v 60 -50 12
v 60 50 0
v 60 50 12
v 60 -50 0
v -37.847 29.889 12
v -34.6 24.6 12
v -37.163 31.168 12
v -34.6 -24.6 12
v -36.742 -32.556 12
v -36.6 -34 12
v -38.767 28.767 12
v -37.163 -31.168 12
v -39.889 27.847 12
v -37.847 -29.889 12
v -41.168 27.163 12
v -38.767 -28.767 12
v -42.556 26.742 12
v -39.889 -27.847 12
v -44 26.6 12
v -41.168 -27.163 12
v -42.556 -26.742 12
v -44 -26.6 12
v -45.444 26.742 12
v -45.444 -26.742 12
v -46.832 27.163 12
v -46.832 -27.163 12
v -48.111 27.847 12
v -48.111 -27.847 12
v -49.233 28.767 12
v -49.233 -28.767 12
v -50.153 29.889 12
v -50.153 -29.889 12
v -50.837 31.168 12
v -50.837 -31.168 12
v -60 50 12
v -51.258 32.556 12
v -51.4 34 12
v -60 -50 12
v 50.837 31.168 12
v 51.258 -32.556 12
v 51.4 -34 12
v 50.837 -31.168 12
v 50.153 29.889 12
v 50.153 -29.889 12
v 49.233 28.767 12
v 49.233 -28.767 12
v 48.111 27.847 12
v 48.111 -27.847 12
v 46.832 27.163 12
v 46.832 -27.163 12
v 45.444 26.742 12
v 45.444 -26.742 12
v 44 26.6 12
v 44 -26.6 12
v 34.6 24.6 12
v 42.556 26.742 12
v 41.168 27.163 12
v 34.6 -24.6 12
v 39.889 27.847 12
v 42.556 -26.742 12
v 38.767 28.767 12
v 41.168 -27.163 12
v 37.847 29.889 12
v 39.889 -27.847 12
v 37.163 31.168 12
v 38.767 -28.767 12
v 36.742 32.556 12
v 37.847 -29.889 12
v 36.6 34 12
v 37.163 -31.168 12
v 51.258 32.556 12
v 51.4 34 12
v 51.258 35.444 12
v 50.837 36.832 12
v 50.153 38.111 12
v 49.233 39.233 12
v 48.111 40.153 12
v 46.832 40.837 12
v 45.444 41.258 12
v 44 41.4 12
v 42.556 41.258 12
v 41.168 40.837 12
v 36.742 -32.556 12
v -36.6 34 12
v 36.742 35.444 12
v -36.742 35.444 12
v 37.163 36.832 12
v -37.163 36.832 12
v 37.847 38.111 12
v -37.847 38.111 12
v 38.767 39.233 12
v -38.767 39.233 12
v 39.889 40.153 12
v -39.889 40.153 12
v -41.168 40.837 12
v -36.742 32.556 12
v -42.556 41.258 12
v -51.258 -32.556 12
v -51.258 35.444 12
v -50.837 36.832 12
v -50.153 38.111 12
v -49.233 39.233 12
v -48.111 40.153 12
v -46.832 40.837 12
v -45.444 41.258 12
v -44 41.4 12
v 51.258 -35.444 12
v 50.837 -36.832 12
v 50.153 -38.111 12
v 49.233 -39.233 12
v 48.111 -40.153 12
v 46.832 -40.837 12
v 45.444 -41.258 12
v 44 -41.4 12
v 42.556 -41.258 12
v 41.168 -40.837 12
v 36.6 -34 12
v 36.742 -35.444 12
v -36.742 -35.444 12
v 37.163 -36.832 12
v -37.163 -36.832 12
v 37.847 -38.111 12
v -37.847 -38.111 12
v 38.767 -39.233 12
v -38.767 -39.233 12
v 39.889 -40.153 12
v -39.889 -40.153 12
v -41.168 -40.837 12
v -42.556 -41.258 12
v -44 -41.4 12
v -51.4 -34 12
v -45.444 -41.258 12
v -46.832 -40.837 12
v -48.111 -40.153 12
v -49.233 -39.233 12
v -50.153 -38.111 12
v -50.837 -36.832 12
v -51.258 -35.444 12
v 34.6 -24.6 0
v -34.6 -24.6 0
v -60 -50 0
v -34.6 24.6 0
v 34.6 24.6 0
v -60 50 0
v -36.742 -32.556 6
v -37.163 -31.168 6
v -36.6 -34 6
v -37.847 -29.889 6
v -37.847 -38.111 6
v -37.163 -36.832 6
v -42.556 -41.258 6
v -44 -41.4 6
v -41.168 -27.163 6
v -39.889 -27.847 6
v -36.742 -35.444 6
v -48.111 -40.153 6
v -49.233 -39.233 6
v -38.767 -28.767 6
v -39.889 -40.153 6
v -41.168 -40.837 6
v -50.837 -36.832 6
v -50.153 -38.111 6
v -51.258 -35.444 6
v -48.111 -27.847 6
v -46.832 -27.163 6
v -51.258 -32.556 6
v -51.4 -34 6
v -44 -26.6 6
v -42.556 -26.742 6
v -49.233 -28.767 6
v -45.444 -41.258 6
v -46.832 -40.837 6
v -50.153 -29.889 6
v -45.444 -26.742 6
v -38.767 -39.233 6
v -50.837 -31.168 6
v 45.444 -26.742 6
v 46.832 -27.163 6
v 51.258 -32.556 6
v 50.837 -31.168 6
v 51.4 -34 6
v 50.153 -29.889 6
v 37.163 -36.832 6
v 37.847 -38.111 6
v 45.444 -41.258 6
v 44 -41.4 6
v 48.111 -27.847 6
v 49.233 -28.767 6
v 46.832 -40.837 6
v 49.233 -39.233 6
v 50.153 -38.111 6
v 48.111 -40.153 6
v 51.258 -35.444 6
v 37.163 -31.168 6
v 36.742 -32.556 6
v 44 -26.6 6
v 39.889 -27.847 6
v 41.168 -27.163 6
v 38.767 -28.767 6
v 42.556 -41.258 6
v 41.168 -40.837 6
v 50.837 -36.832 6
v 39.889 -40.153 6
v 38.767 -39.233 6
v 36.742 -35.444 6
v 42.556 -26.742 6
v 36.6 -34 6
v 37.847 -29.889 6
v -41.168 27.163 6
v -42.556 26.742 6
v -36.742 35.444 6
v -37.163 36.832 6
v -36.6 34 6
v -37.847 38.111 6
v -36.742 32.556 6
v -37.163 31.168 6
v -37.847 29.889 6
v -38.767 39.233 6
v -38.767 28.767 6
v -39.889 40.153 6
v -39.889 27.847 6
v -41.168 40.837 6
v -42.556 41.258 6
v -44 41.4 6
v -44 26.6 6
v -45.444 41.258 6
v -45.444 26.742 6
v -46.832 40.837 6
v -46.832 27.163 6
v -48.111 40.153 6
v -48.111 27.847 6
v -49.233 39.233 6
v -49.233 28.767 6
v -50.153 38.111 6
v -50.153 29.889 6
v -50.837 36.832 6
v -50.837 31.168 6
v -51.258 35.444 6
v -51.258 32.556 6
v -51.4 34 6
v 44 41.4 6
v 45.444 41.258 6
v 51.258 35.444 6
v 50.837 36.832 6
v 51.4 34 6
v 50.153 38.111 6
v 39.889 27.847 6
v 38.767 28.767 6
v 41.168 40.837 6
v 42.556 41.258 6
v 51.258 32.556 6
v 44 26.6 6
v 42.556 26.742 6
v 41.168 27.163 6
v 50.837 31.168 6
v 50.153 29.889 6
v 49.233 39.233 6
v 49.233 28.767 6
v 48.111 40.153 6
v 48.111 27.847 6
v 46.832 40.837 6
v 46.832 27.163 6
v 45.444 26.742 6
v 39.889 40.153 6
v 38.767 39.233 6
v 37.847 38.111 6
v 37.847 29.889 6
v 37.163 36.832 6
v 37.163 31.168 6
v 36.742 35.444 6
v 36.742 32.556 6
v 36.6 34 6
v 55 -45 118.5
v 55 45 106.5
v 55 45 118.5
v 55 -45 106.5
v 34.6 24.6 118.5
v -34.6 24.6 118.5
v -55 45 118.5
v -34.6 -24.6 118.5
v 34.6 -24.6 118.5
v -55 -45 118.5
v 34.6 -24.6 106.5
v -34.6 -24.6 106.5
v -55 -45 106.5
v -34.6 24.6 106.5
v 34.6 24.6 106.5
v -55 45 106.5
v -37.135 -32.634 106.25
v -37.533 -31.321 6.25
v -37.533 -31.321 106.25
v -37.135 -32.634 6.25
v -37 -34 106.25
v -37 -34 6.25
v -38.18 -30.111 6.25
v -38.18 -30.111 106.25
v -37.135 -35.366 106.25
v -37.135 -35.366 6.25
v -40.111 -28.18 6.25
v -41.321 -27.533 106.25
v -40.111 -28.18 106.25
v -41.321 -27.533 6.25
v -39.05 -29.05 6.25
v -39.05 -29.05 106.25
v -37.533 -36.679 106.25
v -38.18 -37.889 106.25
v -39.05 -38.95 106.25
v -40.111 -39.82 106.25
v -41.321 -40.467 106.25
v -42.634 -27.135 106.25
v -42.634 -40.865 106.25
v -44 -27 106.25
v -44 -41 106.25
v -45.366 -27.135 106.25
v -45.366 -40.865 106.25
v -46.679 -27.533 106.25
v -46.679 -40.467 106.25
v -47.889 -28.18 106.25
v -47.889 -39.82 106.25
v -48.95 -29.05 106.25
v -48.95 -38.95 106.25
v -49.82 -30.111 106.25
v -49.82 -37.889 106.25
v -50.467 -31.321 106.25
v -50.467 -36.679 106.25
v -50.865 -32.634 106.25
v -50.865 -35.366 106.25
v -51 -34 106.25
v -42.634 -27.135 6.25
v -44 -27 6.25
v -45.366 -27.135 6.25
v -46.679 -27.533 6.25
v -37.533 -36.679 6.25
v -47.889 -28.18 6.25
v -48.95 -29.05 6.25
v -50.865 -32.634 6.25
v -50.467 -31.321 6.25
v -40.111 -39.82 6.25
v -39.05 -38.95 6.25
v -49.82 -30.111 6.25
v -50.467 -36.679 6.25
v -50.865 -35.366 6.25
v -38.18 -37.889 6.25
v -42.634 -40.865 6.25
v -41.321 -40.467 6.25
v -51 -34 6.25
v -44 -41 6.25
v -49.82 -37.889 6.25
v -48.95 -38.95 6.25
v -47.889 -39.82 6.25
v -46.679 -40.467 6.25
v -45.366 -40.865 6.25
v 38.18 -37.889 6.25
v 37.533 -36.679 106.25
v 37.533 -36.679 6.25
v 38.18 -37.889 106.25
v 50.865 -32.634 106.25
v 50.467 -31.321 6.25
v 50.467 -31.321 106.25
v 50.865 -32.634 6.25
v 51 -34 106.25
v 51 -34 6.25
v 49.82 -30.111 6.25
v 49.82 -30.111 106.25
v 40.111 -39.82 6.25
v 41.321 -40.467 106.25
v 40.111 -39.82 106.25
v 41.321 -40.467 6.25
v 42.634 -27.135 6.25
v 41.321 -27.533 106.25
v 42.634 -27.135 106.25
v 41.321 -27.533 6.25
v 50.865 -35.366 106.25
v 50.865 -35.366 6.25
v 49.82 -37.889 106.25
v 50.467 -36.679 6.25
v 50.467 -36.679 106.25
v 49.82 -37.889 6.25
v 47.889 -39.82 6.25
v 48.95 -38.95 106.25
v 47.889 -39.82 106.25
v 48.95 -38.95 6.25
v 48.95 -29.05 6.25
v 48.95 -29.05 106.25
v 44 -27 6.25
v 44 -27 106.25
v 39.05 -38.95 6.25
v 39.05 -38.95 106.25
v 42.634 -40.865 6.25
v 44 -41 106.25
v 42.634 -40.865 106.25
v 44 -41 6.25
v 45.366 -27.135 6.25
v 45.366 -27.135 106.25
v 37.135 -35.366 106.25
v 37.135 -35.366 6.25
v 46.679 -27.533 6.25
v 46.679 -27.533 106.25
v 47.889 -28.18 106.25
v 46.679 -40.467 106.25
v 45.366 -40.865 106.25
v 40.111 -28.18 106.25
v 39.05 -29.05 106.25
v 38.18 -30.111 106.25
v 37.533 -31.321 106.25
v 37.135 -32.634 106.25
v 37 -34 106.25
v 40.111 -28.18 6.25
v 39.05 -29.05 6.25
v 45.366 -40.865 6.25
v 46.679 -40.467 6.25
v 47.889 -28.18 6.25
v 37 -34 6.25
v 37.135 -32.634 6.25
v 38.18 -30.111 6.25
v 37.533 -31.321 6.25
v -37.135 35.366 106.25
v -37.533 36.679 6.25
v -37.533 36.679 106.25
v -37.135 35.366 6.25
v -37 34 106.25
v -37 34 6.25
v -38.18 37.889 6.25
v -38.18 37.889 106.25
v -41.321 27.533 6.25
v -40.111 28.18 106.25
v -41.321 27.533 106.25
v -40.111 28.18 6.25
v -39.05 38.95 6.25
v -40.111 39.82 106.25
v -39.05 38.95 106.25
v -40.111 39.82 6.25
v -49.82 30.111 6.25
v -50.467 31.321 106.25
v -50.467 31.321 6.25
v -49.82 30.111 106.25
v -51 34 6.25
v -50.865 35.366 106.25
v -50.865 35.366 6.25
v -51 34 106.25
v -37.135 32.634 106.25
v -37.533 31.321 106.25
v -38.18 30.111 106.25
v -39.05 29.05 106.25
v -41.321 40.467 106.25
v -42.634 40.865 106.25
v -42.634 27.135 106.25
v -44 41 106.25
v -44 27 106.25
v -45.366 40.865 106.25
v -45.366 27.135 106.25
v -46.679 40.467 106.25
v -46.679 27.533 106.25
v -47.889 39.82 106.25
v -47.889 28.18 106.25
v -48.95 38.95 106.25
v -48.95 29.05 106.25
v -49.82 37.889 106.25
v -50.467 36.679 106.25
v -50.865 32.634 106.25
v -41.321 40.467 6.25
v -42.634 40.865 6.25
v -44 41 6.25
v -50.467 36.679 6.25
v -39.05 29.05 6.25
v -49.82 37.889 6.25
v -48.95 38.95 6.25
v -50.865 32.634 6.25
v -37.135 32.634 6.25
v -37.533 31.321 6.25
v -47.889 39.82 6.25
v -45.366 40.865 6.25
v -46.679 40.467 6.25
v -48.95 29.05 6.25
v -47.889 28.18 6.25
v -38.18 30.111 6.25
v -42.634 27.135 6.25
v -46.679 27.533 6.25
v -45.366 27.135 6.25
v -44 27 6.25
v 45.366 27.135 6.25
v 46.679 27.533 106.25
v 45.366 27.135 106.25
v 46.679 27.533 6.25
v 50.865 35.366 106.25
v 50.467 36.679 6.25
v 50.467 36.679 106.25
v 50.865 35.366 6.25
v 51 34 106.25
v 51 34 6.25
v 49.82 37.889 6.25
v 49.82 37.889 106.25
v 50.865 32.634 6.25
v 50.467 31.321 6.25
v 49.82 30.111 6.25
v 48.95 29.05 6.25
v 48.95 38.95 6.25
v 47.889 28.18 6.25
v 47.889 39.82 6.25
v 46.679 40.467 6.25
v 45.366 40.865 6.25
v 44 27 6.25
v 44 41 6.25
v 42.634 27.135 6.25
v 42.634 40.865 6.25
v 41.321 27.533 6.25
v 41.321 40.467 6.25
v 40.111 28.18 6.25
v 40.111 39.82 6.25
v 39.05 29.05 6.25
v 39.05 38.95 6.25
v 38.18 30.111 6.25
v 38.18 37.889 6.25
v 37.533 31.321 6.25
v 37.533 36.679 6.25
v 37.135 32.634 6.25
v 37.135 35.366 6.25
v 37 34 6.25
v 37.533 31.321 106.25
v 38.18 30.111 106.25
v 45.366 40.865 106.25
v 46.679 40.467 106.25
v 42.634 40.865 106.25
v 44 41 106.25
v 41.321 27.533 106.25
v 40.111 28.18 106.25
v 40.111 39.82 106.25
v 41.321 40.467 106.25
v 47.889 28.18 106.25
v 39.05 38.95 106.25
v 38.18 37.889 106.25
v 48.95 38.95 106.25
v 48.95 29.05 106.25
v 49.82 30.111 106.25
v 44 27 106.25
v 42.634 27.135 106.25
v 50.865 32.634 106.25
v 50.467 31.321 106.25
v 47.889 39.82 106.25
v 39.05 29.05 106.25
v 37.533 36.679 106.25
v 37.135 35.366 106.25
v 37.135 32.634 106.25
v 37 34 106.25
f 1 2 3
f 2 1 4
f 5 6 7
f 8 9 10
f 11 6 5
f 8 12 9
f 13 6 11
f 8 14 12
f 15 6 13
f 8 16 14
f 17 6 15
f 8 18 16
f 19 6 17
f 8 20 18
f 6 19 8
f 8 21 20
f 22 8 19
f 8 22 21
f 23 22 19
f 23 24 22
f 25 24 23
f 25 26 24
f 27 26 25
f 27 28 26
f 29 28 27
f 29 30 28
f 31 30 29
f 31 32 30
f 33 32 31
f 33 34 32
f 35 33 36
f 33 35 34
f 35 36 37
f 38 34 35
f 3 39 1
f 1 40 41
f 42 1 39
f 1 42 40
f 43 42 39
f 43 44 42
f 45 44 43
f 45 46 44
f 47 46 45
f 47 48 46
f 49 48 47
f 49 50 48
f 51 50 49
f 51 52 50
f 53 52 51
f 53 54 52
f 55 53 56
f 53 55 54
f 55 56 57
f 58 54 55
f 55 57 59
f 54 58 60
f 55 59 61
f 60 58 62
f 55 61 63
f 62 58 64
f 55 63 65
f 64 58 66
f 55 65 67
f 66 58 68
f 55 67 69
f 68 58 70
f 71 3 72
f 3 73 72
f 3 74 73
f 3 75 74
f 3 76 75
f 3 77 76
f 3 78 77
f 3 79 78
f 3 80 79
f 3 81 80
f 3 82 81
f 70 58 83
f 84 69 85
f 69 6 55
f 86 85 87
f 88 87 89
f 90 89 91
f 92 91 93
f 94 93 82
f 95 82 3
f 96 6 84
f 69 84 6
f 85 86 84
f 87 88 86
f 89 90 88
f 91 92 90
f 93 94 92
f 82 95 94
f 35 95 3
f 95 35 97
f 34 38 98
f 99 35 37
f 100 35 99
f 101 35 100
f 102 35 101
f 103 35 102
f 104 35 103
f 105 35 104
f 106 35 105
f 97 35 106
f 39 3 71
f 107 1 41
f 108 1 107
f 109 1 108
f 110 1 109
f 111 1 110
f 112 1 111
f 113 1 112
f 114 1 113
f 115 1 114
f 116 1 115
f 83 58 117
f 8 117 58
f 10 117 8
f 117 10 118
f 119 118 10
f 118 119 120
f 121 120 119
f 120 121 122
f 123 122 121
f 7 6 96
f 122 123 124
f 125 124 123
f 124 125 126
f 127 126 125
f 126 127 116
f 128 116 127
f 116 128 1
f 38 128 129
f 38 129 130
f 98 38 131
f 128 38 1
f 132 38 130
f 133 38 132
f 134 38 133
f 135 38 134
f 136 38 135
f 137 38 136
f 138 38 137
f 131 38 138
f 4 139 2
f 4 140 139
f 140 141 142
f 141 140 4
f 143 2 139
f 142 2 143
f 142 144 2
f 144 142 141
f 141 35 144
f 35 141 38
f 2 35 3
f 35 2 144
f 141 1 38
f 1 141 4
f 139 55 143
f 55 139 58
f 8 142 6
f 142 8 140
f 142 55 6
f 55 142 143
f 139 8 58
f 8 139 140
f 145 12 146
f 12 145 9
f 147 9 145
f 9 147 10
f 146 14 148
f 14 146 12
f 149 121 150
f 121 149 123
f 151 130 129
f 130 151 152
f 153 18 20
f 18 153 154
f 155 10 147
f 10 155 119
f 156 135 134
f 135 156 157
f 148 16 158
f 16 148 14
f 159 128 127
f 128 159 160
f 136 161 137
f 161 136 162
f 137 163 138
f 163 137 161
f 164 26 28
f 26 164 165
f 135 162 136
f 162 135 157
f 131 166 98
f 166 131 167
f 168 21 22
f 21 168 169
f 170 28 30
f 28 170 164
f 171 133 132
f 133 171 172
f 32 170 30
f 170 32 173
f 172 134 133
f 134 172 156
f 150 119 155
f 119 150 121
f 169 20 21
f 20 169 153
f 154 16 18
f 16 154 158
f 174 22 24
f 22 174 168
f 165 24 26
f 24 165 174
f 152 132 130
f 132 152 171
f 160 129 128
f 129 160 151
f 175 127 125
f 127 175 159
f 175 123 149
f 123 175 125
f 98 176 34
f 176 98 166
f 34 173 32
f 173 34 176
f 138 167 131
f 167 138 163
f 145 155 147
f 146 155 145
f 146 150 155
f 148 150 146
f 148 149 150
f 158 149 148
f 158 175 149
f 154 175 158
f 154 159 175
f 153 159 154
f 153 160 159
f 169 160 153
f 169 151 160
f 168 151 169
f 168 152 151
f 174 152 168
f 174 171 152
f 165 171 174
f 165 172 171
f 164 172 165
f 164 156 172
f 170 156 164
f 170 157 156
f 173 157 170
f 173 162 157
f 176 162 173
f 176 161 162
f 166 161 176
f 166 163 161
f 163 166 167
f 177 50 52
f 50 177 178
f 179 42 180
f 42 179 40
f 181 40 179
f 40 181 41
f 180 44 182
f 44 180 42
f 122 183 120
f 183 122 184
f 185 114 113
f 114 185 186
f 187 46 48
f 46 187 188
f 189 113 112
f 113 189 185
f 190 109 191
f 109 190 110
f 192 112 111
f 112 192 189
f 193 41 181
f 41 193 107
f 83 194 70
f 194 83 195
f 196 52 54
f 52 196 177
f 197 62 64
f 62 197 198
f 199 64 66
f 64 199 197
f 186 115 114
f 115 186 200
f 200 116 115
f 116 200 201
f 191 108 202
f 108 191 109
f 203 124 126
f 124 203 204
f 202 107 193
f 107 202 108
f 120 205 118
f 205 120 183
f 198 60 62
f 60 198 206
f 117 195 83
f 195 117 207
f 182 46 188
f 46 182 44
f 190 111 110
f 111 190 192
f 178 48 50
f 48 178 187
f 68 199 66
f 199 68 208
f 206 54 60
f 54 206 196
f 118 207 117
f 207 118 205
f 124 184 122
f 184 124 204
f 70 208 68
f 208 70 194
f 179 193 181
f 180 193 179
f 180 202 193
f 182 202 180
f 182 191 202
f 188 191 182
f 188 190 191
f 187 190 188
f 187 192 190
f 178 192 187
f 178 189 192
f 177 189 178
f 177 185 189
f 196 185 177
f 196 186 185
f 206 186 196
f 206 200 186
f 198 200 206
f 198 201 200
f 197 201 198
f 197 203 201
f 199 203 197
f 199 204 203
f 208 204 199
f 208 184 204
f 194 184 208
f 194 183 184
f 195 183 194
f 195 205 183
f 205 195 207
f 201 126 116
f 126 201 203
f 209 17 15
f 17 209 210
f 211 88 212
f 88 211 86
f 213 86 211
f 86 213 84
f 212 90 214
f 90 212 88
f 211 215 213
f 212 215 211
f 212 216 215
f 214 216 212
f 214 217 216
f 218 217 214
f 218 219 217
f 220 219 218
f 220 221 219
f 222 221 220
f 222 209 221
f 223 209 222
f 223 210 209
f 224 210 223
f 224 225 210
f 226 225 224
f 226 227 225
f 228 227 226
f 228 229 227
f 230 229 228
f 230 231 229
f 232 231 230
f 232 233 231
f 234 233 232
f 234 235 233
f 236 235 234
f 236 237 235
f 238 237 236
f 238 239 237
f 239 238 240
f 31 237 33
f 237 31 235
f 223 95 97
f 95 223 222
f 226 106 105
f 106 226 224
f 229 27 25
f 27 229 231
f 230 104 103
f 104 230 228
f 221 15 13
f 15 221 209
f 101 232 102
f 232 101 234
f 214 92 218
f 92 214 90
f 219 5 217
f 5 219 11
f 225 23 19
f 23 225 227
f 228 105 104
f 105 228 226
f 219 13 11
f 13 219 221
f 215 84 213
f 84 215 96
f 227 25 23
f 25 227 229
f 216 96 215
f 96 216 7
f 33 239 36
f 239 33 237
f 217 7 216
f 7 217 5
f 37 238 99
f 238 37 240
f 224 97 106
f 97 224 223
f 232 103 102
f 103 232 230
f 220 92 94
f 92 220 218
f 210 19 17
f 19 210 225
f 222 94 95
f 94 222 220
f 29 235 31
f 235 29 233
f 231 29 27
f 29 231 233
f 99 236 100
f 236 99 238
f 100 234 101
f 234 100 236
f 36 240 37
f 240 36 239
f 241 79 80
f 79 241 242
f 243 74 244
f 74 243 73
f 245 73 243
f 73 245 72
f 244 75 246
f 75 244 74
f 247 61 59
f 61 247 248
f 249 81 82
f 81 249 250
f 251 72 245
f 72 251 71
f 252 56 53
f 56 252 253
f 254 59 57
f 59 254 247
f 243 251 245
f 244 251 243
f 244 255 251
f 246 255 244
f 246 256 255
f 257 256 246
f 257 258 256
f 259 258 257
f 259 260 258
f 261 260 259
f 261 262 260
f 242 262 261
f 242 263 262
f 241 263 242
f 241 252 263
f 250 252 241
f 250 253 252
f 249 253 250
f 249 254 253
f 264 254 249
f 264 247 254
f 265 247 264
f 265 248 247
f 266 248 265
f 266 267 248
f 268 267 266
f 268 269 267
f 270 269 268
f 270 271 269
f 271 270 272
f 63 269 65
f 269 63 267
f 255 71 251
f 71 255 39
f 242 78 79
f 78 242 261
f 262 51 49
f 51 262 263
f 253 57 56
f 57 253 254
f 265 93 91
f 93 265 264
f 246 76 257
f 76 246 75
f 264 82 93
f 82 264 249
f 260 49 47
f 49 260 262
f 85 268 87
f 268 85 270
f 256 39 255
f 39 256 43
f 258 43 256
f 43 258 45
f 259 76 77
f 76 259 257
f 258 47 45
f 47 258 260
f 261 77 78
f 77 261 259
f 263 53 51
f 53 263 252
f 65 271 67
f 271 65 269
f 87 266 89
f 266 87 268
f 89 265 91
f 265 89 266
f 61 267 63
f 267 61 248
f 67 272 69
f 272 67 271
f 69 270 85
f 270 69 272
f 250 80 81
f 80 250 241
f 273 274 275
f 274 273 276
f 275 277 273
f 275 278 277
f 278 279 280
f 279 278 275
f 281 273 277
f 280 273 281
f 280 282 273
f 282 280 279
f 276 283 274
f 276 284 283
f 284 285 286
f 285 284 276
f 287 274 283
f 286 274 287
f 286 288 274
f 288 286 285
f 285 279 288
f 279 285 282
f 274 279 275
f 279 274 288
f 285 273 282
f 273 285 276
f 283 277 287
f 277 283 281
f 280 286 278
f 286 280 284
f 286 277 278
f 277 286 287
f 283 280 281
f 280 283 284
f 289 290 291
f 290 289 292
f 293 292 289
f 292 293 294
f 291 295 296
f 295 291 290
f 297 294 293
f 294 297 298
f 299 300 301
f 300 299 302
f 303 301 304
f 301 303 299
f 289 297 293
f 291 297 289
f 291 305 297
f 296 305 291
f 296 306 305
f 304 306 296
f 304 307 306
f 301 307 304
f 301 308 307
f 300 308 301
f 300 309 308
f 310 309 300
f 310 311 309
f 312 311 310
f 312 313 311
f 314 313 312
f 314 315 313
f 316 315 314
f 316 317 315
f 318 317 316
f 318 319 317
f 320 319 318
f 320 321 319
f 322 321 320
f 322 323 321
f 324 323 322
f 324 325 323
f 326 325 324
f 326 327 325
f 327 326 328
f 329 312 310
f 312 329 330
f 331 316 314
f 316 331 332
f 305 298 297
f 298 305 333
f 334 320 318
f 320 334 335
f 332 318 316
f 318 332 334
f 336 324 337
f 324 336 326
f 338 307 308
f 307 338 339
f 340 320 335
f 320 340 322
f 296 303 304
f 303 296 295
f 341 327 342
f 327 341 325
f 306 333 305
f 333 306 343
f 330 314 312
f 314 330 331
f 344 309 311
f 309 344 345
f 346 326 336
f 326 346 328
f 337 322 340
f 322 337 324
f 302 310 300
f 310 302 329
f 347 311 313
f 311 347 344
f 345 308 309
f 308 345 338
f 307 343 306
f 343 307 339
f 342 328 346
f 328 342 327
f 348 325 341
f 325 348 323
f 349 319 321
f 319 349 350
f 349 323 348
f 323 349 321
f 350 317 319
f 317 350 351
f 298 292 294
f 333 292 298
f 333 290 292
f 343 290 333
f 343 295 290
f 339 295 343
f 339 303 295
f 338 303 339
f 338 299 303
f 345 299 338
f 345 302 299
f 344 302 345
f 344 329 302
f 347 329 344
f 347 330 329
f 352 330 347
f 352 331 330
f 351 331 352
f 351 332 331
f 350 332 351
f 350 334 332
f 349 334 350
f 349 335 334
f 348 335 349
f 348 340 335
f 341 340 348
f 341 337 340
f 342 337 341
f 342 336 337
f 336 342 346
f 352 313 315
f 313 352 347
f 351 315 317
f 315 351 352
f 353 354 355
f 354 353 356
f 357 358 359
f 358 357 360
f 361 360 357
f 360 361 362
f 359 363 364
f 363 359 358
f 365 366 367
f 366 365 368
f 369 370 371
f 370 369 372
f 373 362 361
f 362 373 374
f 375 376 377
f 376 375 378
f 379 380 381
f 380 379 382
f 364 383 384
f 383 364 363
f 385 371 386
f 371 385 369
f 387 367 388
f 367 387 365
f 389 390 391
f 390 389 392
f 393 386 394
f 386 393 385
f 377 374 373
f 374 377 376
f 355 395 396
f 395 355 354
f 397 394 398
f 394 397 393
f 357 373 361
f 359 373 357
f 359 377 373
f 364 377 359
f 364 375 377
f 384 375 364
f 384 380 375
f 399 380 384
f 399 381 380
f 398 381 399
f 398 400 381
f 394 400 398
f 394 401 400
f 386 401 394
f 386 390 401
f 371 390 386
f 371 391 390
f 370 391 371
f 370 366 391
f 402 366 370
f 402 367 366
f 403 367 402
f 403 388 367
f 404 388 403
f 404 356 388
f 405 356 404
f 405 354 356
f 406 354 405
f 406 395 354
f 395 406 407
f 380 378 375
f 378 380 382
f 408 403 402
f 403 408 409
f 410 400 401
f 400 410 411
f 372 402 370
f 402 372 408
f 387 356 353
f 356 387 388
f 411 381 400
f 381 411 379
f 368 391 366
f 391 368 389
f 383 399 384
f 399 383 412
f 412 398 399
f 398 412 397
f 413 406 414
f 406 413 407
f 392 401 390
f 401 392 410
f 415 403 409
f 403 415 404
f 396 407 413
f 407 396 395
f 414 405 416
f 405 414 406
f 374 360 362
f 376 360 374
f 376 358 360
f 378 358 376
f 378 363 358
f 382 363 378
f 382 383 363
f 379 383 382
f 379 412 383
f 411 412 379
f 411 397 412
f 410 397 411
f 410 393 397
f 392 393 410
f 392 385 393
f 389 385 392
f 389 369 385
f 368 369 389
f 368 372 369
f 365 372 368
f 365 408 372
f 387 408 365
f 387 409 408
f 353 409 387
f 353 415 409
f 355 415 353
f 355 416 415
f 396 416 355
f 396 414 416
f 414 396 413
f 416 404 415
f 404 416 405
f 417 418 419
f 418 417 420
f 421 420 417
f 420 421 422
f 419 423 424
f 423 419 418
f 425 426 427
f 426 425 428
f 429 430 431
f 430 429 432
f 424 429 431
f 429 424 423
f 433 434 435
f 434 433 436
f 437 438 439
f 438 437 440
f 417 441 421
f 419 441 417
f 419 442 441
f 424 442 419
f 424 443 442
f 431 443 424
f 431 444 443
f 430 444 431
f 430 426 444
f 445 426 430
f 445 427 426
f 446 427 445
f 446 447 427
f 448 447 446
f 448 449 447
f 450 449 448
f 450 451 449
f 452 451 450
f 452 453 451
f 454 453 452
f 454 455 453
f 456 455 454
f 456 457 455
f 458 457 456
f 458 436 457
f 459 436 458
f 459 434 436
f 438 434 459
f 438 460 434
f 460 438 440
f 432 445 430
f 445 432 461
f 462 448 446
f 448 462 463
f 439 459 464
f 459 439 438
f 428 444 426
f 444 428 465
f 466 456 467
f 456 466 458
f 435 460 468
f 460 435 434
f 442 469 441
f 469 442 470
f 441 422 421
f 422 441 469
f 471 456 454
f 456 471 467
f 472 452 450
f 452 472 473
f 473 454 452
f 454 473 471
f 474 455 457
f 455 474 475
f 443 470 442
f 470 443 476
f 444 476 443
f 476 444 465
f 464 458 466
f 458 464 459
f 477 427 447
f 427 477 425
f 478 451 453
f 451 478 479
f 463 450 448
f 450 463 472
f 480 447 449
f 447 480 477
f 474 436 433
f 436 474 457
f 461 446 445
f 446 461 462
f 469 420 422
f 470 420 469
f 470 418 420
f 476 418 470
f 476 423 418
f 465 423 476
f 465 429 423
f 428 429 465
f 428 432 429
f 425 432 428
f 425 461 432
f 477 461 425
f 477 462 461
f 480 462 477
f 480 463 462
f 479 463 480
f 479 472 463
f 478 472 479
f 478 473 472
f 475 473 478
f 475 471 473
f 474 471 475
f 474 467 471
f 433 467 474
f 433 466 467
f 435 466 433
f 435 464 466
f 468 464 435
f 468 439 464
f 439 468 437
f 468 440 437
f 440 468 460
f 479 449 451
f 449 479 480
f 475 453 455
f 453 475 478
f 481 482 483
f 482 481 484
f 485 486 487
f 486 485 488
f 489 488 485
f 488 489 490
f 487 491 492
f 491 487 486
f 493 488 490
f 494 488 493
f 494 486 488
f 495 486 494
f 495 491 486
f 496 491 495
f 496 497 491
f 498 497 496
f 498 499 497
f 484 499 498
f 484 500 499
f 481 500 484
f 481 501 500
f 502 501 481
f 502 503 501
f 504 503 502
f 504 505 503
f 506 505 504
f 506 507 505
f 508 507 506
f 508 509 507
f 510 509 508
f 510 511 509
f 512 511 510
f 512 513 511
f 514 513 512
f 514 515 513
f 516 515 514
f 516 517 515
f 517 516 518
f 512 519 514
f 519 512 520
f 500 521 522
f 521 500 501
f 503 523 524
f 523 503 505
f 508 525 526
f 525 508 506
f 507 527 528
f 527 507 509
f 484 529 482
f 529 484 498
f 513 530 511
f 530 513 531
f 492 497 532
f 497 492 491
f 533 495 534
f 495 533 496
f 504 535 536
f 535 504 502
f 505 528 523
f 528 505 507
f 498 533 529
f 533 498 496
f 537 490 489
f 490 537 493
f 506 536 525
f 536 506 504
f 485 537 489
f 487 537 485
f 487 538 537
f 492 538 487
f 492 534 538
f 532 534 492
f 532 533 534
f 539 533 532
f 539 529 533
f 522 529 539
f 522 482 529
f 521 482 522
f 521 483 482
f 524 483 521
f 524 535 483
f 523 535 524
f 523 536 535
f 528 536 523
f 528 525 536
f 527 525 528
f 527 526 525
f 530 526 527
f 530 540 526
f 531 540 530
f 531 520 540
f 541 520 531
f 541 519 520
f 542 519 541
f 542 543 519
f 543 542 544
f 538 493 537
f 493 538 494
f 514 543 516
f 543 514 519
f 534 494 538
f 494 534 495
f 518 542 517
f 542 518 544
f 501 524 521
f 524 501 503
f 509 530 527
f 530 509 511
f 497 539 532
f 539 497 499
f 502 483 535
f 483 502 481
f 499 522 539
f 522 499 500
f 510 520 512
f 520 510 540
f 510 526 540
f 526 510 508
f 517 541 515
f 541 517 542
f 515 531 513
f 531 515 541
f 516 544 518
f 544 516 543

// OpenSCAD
$fn = 32;

// ------------------------------------------------------------------------
// Frame cube: base 120 x 100 mm, posts 100 mm tall
// Every part is its own module, assembly() places every instance.
// ------------------------------------------------------------------------

// --- part 1 ---
module base_frame() {
  difference() {
    translate([-60, -50, 0]) cube([120, 100, 12]);
    translate([-34.6, -24.6, -1]) cube([69.2, 49.2, 14]);
    translate([-44, -34, 6]) cylinder(h = 7, d = 14.8);
    translate([44, -34, 6]) cylinder(h = 7, d = 14.8);
    translate([-44, 34, 6]) cylinder(h = 7, d = 14.8);
    translate([44, 34, 6]) cylinder(h = 7, d = 14.8);
  }
}

// --- part 2 ---
module corner_post() {
  cylinder(h = 100, d = 14);
}

// --- part 3 ---
module top_frame() {
  difference() {
    translate([-55, -45, 0]) cube([110, 90, 12]);
    translate([-34.6, -24.6, -1]) cube([69.2, 49.2, 14]);
  }
}

// --- assembly ---
module assembly() {
  color([0.80, 0.24, 0.20]) translate([0, 0, 0]) rotate([0, 0, 0]) base_frame();
  color([0.20, 0.45, 0.75]) translate([-44, -34, 6.25]) rotate([0, 0, 0]) corner_post();
  color([0.25, 0.62, 0.32]) translate([44, -34, 6.25]) rotate([0, 0, 0]) corner_post();
  color([0.92, 0.70, 0.18]) translate([-44, 34, 6.25]) rotate([0, 0, 0]) corner_post();
  color([0.58, 0.35, 0.70]) translate([44, 34, 6.25]) rotate([0, 0, 0]) corner_post();
  color([0.16, 0.66, 0.66]) translate([0, 0, 106.5]) rotate([0, 0, 0]) top_frame();
}

assembly();
